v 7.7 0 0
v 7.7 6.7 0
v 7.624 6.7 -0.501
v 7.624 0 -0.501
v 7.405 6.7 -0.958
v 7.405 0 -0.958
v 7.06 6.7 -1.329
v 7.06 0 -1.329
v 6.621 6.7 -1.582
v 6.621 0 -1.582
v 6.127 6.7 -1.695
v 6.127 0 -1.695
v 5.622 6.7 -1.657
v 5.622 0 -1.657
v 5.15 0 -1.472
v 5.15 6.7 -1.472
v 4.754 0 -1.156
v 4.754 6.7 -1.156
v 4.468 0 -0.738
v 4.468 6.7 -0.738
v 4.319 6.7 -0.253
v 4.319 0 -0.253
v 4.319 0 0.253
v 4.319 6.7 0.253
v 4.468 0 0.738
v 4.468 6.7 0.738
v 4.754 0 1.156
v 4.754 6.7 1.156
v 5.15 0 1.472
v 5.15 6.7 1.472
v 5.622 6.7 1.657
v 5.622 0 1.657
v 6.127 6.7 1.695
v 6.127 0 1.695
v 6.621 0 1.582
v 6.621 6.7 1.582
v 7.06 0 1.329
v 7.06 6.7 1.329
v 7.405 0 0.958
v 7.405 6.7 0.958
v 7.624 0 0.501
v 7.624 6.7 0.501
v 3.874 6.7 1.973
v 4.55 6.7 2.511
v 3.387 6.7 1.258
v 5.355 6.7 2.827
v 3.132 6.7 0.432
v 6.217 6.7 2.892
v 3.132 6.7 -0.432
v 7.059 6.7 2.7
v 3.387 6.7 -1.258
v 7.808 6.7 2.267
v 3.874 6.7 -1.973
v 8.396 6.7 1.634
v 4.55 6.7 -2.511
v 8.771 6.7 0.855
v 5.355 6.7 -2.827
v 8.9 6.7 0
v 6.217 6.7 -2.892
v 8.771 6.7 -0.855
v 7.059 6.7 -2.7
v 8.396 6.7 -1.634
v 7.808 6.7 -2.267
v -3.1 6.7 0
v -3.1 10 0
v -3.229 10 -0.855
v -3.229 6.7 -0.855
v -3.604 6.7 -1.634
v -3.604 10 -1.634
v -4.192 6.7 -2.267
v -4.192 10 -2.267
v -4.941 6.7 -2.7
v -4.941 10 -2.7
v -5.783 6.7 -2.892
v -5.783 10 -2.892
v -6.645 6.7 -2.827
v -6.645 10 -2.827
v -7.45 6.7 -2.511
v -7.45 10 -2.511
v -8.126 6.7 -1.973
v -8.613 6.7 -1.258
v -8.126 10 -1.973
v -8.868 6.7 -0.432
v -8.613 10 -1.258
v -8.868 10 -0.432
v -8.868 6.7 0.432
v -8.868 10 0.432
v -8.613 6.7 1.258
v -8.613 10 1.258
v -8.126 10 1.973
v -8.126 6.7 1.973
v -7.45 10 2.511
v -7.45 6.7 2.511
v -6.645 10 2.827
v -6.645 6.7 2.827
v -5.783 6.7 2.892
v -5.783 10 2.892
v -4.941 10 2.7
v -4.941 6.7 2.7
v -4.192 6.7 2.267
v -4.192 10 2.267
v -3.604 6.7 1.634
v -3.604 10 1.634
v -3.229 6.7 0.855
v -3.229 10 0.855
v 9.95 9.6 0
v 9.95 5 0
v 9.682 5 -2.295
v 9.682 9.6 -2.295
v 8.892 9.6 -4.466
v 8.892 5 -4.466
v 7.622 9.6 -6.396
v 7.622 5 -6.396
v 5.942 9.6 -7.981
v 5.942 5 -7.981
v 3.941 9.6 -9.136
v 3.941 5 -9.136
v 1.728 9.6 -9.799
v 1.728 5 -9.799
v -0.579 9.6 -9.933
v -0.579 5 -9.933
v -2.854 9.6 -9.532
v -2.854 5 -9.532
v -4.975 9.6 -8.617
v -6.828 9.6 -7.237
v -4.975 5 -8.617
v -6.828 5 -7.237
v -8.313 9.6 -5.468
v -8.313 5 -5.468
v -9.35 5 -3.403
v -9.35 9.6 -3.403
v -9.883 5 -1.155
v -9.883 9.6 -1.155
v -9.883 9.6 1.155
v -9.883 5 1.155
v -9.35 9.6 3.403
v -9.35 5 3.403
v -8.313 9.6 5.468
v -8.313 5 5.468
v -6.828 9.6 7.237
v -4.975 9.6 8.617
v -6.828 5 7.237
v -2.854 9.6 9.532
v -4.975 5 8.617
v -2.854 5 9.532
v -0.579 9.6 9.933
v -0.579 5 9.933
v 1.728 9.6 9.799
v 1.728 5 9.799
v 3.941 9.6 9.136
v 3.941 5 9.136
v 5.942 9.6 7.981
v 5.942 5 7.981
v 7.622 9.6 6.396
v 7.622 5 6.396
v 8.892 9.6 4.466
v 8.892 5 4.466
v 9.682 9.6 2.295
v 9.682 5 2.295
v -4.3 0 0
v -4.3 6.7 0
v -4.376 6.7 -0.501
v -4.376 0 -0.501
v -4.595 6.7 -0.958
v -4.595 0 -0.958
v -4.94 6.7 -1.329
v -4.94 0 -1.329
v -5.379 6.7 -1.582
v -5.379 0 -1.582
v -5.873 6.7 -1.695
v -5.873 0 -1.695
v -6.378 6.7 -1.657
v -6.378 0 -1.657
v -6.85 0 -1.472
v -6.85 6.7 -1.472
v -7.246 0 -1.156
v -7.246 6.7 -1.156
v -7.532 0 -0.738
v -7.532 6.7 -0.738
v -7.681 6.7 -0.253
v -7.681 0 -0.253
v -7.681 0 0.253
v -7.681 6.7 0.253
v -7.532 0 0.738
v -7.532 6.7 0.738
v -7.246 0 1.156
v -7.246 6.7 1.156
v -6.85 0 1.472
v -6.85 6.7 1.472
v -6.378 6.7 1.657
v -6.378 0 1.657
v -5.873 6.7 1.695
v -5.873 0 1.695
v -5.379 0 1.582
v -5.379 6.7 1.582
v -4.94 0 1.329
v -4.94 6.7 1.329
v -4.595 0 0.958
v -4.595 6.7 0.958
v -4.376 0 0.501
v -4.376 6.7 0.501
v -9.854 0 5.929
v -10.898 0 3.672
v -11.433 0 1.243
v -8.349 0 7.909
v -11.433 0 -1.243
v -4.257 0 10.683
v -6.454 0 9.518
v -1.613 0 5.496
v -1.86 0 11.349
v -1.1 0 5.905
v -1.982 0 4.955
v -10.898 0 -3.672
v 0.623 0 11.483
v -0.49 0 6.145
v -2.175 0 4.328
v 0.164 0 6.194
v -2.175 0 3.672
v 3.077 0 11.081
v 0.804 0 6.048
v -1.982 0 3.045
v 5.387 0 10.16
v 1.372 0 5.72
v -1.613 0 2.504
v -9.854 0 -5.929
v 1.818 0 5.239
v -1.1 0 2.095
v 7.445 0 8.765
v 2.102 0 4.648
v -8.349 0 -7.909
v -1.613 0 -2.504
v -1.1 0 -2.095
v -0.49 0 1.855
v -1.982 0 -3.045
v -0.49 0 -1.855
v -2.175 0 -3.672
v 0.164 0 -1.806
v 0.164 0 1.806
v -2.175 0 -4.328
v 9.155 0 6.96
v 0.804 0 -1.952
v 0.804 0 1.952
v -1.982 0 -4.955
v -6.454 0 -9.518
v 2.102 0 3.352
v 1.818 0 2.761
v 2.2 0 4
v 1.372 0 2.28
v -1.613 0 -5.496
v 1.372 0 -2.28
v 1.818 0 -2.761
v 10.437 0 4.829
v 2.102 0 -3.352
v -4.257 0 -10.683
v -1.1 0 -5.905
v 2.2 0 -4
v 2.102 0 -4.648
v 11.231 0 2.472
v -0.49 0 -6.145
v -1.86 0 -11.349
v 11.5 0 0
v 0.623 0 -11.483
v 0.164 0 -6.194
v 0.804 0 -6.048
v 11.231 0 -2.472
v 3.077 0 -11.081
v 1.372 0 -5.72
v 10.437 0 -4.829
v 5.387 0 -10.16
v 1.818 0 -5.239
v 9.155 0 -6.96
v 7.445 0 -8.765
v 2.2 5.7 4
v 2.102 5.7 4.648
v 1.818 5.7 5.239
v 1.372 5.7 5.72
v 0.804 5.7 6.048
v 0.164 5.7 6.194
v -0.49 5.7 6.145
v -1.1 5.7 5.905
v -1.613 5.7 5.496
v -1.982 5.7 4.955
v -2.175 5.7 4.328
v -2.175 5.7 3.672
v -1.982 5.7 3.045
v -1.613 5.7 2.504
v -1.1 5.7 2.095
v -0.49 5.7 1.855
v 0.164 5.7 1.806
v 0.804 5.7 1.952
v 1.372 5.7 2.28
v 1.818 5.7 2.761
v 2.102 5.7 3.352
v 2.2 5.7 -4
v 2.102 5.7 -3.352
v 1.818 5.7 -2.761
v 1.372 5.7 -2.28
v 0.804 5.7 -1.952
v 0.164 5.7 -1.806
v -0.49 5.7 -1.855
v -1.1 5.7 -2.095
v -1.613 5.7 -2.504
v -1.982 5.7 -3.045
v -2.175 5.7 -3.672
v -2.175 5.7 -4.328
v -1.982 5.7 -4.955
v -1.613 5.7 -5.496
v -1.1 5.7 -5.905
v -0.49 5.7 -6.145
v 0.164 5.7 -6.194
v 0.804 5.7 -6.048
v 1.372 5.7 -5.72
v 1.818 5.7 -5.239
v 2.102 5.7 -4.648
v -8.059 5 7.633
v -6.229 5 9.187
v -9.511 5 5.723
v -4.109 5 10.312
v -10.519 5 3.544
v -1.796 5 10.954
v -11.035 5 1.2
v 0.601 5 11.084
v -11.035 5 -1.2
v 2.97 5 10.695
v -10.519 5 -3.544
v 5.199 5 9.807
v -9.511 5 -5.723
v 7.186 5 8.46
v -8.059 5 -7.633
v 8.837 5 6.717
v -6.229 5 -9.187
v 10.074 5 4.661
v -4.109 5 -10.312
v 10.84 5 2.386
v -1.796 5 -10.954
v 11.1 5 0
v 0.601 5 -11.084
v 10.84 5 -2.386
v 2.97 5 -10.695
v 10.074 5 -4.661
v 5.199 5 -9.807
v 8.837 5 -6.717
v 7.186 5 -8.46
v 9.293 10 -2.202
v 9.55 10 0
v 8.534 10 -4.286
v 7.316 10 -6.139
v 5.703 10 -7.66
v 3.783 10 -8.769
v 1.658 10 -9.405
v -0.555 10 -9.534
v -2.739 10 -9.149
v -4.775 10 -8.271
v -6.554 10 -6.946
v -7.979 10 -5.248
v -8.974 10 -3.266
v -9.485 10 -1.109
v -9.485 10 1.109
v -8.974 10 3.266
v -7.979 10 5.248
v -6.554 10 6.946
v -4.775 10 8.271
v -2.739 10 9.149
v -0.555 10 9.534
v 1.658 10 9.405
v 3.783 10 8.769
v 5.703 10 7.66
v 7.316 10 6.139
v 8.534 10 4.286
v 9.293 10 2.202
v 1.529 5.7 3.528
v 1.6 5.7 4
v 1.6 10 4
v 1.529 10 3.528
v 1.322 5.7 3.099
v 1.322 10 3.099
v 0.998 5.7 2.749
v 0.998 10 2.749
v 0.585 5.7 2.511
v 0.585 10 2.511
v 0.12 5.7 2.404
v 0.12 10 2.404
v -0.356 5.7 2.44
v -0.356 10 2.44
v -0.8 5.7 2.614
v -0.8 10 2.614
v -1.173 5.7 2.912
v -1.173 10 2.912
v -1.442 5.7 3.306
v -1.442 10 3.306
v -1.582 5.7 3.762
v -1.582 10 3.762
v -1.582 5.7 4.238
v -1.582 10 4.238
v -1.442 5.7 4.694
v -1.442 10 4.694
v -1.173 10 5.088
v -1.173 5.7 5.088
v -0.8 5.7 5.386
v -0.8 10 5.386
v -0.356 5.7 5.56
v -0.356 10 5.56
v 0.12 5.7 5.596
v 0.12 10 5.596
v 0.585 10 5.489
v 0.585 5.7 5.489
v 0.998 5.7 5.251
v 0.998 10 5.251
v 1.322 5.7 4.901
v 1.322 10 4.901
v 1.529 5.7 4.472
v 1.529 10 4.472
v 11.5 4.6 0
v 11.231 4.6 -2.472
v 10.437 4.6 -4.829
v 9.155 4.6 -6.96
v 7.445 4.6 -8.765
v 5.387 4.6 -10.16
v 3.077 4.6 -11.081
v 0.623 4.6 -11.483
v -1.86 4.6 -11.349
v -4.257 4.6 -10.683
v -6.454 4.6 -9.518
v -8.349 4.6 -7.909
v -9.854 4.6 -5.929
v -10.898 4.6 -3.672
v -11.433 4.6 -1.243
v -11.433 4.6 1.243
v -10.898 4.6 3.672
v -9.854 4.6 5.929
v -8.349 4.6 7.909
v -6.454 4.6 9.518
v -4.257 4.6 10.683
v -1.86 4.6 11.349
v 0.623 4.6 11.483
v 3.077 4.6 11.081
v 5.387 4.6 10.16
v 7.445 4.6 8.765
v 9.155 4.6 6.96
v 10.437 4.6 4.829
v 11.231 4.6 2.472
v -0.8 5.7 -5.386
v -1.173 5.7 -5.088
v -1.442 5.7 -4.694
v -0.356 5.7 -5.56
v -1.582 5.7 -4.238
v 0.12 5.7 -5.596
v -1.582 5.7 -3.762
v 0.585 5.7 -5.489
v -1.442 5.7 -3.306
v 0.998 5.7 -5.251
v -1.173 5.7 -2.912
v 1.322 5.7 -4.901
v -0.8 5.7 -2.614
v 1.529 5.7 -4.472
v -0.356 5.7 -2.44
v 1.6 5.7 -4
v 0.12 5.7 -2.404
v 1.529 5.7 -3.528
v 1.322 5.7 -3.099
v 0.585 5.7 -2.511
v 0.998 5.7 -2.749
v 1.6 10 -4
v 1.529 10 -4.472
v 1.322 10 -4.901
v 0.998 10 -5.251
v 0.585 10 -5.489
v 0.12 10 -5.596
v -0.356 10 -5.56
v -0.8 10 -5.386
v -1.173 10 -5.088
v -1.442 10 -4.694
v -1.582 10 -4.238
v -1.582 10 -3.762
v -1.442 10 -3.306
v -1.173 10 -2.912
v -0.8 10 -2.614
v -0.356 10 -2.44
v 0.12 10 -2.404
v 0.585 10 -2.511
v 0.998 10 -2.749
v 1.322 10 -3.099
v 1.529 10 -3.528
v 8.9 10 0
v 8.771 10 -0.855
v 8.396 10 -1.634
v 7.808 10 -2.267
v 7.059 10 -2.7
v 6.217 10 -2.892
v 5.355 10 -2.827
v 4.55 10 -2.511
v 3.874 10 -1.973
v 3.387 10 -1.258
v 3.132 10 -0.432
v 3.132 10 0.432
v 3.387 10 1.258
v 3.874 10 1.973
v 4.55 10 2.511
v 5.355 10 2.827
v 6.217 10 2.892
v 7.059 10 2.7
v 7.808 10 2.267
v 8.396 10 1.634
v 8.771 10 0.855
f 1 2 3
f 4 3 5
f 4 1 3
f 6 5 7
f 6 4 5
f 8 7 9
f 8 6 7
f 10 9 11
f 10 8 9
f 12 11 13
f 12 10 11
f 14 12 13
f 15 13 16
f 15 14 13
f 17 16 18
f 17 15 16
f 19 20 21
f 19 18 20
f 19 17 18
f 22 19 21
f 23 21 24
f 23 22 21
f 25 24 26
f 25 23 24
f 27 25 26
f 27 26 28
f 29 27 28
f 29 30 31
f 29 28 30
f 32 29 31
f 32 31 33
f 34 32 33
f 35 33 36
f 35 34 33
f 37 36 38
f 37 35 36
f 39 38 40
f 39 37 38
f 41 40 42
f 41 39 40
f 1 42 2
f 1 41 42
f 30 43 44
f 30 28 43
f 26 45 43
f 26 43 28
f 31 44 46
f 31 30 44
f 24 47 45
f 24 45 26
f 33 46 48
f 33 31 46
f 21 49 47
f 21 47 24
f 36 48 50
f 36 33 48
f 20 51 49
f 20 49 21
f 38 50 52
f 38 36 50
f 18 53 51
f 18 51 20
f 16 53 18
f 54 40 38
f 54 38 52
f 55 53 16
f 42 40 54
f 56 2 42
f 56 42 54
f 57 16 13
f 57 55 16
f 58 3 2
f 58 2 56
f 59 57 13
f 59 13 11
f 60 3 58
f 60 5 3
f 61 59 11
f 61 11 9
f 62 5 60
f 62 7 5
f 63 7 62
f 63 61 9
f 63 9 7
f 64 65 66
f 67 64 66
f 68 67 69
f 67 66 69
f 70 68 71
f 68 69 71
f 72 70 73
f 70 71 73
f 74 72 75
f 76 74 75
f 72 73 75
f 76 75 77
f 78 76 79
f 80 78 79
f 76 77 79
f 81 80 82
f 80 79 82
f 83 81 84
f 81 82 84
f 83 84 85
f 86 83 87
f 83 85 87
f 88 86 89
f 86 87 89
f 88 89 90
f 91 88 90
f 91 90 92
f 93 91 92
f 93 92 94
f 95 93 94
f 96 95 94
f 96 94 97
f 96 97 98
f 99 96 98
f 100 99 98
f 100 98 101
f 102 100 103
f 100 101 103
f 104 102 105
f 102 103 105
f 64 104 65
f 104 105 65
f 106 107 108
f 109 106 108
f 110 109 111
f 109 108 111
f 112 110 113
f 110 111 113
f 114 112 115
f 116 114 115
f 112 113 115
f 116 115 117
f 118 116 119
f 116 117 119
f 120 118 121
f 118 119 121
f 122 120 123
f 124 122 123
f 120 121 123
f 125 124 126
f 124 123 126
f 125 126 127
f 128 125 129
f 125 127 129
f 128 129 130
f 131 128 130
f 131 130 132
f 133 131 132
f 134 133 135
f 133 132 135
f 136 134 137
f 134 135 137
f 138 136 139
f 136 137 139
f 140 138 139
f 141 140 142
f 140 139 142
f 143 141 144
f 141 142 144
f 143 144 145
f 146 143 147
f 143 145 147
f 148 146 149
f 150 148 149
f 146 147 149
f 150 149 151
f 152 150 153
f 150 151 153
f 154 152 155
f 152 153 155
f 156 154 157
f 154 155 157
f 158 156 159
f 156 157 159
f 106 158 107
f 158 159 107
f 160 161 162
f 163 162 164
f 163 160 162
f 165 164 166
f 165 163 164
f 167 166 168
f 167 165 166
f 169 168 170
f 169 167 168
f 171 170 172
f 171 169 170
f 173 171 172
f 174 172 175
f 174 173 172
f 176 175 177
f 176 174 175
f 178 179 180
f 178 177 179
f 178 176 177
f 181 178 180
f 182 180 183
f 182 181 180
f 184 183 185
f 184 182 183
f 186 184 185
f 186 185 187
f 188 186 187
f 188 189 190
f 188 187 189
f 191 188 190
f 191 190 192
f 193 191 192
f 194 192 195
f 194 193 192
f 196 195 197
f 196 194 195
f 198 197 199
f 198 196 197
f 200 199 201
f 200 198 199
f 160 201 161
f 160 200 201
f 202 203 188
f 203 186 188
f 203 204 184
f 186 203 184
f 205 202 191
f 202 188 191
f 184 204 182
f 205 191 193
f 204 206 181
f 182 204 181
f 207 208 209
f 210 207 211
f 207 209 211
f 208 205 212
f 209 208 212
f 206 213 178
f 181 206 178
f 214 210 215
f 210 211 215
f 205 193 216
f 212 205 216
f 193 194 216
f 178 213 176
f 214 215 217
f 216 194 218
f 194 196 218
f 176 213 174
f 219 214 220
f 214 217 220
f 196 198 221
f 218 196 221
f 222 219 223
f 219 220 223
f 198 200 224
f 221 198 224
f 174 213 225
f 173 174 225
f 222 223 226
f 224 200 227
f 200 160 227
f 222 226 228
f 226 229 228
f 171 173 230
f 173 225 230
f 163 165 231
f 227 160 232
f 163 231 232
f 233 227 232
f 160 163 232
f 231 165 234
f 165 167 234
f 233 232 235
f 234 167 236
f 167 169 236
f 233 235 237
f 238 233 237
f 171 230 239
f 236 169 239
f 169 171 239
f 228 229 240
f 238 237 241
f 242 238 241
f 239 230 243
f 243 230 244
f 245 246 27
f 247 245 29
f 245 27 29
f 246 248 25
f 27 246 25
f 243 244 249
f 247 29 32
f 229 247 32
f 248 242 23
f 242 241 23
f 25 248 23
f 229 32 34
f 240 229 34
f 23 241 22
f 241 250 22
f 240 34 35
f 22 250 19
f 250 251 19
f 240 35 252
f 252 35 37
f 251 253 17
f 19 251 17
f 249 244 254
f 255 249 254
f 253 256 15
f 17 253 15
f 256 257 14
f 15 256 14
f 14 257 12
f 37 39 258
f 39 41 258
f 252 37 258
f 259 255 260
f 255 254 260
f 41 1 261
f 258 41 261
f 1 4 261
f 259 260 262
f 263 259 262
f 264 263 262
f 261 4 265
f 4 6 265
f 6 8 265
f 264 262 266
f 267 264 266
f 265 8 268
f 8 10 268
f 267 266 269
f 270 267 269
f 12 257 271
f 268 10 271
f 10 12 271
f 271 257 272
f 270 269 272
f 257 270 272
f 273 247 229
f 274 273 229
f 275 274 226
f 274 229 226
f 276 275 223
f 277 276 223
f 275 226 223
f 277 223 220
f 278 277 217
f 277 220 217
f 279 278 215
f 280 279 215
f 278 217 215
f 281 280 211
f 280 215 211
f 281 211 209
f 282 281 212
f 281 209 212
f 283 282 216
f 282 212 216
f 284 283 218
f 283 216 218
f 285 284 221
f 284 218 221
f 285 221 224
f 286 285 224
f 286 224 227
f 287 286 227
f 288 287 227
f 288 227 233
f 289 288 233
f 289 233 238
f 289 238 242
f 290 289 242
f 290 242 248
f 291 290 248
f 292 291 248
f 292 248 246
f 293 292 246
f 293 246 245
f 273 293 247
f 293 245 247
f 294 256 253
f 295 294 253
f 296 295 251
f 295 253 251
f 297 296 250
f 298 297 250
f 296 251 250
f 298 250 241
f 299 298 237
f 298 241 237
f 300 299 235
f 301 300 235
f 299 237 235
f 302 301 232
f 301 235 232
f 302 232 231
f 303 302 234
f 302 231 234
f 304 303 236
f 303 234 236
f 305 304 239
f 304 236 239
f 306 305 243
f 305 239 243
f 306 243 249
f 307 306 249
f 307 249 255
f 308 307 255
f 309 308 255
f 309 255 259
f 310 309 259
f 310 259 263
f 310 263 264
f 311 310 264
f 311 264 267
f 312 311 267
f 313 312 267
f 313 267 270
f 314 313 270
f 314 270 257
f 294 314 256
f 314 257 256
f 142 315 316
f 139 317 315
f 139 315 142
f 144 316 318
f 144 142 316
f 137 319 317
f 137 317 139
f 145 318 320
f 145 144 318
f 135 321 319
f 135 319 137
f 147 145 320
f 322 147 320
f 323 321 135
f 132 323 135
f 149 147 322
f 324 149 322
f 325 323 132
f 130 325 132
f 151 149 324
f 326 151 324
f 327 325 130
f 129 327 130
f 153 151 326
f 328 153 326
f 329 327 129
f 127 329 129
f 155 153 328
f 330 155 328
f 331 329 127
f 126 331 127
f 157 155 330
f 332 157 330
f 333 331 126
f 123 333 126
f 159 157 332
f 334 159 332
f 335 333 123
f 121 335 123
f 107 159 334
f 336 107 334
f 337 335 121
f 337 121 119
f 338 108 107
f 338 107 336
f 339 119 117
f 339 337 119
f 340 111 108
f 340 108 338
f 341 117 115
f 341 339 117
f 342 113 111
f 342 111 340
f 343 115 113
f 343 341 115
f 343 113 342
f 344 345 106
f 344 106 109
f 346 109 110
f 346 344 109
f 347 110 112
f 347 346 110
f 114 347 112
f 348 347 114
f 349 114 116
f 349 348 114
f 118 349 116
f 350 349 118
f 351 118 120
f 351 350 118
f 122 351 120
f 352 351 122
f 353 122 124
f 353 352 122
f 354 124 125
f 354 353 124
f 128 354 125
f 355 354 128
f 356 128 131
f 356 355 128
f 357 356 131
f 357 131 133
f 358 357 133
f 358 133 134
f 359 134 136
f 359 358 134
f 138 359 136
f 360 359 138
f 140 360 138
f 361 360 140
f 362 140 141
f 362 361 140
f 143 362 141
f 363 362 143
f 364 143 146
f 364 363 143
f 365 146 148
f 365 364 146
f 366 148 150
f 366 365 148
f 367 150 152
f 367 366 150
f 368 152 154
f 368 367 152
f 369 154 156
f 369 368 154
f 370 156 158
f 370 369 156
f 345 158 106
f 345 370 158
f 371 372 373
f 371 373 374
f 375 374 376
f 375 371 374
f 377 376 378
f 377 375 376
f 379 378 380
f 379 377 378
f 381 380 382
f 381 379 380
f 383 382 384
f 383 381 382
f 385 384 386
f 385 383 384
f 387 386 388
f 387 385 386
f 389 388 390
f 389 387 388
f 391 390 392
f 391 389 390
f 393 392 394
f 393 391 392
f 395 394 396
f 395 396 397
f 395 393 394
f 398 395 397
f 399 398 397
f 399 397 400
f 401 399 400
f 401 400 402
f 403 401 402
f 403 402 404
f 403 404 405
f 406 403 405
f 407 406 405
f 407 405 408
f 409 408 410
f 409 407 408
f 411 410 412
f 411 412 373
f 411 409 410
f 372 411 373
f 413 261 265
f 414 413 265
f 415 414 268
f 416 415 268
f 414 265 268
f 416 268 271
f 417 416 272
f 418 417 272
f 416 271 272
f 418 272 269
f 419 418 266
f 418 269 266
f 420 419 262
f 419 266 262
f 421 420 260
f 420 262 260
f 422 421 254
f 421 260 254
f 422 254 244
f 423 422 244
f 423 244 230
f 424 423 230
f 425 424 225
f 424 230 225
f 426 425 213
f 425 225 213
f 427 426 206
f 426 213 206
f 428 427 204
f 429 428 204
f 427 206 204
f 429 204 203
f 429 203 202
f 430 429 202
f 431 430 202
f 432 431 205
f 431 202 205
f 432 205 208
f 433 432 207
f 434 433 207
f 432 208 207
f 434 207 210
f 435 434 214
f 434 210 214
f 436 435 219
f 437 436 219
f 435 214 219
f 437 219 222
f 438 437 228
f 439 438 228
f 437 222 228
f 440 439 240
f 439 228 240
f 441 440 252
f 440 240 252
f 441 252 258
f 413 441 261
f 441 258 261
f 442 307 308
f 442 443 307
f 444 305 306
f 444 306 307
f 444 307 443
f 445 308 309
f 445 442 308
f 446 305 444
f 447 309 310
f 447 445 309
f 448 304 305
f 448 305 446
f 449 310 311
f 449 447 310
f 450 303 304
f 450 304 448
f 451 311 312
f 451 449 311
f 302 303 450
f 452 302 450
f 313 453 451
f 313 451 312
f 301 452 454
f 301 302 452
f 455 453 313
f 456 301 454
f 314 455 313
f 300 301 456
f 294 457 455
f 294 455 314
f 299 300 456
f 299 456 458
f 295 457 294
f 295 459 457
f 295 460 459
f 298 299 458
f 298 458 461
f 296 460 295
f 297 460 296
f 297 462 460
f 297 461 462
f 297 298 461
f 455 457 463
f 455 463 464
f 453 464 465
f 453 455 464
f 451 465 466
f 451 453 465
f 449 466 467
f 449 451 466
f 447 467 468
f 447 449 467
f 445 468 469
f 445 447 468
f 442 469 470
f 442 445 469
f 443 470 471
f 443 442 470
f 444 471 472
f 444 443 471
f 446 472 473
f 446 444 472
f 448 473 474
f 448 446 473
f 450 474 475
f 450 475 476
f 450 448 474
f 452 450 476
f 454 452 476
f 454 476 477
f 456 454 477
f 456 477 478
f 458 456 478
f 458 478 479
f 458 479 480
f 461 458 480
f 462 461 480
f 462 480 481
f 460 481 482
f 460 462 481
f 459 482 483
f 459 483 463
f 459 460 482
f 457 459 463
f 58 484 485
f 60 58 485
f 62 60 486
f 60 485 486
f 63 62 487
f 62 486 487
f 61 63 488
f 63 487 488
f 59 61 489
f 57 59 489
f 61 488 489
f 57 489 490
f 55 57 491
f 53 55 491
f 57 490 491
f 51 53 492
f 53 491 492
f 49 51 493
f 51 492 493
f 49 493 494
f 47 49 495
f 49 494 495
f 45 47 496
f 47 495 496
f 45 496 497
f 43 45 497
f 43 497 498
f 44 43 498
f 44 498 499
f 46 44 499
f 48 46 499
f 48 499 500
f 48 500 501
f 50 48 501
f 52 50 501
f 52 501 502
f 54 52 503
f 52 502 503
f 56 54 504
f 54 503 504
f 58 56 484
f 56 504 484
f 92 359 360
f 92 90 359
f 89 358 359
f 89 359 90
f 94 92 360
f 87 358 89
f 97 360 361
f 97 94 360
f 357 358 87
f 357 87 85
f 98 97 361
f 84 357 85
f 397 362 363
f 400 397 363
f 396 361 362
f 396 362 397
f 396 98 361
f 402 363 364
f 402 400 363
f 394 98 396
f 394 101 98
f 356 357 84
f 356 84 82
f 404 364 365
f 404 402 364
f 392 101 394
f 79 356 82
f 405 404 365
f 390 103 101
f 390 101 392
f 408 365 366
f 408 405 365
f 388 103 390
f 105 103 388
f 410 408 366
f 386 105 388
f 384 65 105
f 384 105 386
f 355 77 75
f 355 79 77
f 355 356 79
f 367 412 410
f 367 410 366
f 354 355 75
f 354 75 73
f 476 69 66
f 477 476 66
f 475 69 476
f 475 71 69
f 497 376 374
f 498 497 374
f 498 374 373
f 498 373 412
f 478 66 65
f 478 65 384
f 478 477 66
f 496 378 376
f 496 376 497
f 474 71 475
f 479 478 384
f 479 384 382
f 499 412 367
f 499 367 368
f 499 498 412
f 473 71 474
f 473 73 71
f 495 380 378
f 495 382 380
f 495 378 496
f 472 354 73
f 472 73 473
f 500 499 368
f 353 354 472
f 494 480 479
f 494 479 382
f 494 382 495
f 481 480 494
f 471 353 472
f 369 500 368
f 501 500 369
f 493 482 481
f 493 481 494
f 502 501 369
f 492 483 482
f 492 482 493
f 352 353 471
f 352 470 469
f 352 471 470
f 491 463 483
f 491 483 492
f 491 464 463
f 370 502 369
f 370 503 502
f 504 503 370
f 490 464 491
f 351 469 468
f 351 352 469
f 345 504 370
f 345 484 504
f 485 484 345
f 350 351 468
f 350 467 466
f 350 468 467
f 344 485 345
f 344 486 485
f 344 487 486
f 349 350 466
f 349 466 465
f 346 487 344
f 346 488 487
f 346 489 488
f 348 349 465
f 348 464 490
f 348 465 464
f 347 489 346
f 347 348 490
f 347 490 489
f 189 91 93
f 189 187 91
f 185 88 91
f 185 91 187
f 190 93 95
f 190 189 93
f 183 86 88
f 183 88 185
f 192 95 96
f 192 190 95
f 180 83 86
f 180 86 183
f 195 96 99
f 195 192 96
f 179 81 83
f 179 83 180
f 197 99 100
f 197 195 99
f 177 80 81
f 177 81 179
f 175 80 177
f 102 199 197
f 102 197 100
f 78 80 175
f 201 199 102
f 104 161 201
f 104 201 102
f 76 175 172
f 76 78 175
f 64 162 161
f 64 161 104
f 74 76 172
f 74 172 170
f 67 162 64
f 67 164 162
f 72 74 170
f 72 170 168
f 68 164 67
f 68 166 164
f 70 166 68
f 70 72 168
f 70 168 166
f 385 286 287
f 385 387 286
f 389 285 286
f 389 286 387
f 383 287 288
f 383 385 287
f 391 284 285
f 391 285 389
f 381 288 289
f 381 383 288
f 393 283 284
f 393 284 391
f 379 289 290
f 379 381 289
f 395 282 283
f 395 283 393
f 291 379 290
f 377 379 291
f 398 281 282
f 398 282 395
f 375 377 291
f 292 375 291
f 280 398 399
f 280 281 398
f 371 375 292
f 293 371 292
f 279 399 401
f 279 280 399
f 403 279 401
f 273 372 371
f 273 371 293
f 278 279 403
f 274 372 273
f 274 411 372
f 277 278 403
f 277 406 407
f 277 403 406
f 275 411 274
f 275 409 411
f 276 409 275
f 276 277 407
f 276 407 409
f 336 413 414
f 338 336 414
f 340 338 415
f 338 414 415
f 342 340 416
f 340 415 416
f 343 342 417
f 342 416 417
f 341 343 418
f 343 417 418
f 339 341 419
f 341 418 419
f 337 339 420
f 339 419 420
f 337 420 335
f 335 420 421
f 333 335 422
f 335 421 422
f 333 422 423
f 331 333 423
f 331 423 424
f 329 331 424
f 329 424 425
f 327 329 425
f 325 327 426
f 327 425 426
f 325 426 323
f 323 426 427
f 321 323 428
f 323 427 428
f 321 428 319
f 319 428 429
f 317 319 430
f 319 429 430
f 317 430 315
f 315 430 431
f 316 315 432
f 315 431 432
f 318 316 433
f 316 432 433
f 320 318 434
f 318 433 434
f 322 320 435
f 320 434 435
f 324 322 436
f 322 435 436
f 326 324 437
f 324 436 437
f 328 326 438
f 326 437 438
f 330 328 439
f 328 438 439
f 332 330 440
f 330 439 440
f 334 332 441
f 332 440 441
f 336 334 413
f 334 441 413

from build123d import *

# Parameters (mm, degrees)
ESQUISSE1_R             = 11.5
ESQUISSE1_R_2           = 1.7
ESQUISSE1_R_3           = 1.6
BOSS_EXTRU_1_DEPTH      = 5
ESQUISSE2_R             = 9.95
ESQUISSE2_R_2           = 1.7
ESQUISSE2_R_3           = 1.6
BOSS_EXTRU_2_DEPTH      = 5
CHANFREIN2_SIZE         = 0.4
CHANFREIN4_SIZE         = 0.4
ESQUISSE3_R             = 2.2
ENL_V_MAT_EXTRU_1_DEPTH = 5.7
ESQUISSE4_R             = 2.9
ENL_V_MAT_EXTRU_2_DEPTH = 3.3


with BuildPart() as part:
    # Esquisse1 → Boss.-Extru.1 (new body)
    with BuildSketch(Plane(origin=(0, 0, 0), x_dir=(1, 0, 0), z_dir=(0, 1, 0))):
        Circle(ESQUISSE1_R)
        with Locations((6, 0)):
            Circle(ESQUISSE1_R_2, mode=Mode.SUBTRACT)
        with Locations((-6, 0)):
            Circle(ESQUISSE1_R_2, mode=Mode.SUBTRACT)
        with Locations((0, 4)):
            Circle(ESQUISSE1_R_3, mode=Mode.SUBTRACT)
        with Locations((0, -4)):
            Circle(ESQUISSE1_R_3, mode=Mode.SUBTRACT)
    extrude(amount=BOSS_EXTRU_1_DEPTH)

    # Esquisse2 → Boss.-Extru.2 (add)
    with BuildSketch(Plane(origin=(0, 5, 0), x_dir=(1, 0, 0), z_dir=(0, 1, 0))):
        Circle(ESQUISSE2_R)
        with Locations((6, 0)):
            Circle(ESQUISSE2_R_2, mode=Mode.SUBTRACT)
        with Locations((-6, 0)):
            Circle(ESQUISSE2_R_2, mode=Mode.SUBTRACT)
        with Locations((0, -4)):
            Circle(ESQUISSE2_R_3, mode=Mode.SUBTRACT)
        with Locations((0, 4)):
            Circle(ESQUISSE2_R_3, mode=Mode.SUBTRACT)
    extrude(amount=BOSS_EXTRU_2_DEPTH)

    # Chanfrein2
    chanfrein2_edges = [part.edges().sort_by_distance(p)[0] for p in [
        (-9.95, 10, 0),
    ]]
    chamfer(chanfrein2_edges, length=CHANFREIN2_SIZE)

    # Chanfrein4
    chanfrein4_edges = [part.edges().sort_by_distance(p)[0] for p in [
        (-11.5, 5, 0),
    ]]
    chamfer(chanfrein4_edges, length=CHANFREIN4_SIZE)

    # Esquisse3 → Enlèv. mat.-Extru.1 (cut)
    with BuildSketch(Plane.XZ):
        with Locations((0, -4)):
            Circle(ESQUISSE3_R)
        with Locations((0, 4)):
            Circle(ESQUISSE3_R)
    extrude(amount=-ENL_V_MAT_EXTRU_1_DEPTH, mode=Mode.SUBTRACT)

    # Esquisse4 → Enlèv. mat.-Extru.2 (cut)
    with BuildSketch(Plane(origin=(0, 10, 0), x_dir=(1, 0, 0), z_dir=(0, 1, 0))):
        with Locations((-6, 0)):
            Circle(ESQUISSE4_R)
        with Locations((6, 0)):
            Circle(ESQUISSE4_R)
    extrude(amount=-ENL_V_MAT_EXTRU_2_DEPTH, mode=Mode.SUBTRACT)


solid = part.part
